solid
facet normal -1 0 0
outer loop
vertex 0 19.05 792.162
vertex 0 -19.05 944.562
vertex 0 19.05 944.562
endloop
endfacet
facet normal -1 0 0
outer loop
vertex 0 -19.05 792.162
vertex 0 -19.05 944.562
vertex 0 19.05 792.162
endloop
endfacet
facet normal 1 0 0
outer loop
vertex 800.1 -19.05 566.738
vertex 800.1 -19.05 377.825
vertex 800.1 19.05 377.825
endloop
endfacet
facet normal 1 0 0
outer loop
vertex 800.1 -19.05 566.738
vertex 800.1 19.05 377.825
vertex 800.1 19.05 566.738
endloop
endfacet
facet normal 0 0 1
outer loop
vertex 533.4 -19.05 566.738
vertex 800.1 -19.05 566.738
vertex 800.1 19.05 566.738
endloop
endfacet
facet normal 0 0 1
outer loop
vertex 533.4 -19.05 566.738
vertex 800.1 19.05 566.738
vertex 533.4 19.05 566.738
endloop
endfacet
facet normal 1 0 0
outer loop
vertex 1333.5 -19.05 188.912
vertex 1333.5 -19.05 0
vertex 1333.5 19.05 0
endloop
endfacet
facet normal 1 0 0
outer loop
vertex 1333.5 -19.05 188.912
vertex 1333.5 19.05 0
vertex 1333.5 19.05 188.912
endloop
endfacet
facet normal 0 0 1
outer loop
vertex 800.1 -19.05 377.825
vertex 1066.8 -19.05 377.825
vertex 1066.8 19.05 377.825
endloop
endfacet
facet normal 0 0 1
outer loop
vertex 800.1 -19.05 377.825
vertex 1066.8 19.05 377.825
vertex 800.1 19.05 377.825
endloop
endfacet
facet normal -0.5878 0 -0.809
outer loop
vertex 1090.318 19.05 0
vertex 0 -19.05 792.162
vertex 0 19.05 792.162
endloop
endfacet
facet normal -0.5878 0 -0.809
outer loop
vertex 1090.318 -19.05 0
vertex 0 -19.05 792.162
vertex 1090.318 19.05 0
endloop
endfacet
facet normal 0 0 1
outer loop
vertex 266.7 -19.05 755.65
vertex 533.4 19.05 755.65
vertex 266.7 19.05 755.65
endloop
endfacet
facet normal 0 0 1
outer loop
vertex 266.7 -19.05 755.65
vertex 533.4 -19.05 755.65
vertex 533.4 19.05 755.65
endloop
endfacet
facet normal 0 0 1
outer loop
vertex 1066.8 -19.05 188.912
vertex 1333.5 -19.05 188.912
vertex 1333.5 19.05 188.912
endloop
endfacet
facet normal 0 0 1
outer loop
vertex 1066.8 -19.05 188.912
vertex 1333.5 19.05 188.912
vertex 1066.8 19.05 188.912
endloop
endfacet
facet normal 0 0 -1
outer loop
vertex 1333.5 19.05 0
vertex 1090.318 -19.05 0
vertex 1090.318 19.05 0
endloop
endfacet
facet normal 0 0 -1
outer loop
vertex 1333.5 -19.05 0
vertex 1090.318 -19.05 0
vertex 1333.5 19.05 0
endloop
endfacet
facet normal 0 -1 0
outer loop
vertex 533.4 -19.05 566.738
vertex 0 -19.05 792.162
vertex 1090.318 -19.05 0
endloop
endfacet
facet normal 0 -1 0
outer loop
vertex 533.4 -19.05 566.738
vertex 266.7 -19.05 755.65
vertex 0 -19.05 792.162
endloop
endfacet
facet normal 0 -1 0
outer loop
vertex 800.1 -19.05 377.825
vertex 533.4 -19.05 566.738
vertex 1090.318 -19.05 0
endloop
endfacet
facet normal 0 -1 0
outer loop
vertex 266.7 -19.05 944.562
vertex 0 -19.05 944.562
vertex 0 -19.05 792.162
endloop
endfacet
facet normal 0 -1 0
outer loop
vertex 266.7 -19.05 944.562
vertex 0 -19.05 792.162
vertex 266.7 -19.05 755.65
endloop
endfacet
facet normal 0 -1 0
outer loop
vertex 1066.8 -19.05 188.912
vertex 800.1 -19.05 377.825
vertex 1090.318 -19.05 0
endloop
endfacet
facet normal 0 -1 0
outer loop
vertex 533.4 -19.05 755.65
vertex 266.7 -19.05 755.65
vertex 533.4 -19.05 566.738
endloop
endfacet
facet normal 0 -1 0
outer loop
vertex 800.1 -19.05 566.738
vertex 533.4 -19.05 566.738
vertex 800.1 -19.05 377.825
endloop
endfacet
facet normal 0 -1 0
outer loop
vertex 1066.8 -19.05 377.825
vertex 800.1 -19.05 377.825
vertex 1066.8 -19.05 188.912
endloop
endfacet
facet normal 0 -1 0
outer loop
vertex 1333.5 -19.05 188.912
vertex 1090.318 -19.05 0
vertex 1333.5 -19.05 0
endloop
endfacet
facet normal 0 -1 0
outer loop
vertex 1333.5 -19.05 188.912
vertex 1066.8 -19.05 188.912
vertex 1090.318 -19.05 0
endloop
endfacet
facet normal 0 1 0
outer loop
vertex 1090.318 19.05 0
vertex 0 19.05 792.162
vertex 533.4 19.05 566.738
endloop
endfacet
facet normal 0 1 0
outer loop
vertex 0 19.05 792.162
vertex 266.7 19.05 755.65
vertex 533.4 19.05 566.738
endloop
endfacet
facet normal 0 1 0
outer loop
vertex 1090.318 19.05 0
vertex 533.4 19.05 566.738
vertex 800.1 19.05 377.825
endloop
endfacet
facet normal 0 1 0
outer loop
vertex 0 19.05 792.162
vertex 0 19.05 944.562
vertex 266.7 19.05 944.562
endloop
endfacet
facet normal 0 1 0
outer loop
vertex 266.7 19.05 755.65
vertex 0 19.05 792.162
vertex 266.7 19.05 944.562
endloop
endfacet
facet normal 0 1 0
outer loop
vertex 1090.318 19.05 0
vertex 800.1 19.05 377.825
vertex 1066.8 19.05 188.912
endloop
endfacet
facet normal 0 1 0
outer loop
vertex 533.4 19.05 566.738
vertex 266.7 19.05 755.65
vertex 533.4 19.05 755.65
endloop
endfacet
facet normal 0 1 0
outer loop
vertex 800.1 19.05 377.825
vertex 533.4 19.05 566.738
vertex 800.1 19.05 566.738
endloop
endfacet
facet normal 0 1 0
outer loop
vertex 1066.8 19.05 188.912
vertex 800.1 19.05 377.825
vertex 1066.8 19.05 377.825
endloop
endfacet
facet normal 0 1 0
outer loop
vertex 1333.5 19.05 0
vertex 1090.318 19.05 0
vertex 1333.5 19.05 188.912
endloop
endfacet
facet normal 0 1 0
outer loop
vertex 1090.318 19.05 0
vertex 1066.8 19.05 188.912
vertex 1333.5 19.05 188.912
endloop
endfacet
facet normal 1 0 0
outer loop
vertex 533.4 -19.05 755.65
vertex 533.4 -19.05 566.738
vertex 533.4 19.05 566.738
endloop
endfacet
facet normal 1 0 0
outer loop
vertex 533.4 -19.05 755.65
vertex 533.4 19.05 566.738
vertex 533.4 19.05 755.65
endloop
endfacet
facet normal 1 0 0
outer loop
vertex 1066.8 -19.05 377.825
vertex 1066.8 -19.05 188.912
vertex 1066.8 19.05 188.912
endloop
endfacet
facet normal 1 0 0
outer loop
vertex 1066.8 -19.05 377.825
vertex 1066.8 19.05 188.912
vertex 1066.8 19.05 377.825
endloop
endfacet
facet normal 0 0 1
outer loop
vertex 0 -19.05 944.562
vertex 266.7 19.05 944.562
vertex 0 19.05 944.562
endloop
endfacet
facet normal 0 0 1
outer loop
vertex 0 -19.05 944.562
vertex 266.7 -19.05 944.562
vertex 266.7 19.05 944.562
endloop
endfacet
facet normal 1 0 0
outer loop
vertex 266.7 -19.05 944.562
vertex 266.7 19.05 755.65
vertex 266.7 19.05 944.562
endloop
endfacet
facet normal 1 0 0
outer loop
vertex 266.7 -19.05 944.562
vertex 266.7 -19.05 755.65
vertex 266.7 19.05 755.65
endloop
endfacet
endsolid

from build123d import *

# Parameters (mm, degrees)
F1_DEPTH = 19.05


with BuildPart() as f1:
    # F0 (on Front) → F1 (new body, symmetric)
    with BuildSketch(Plane.XZ):
        Polygon((266.7, 944.5625), (0, 944.5625), (0, 792.1625), (1090.318143, 0), (1333.5, 0), (1333.5, 188.9125), (1066.8, 188.9125), (1066.8, 377.825), (800.1, 377.825), (800.1, 566.7375), (533.4, 566.7375), (533.4, 755.65), (266.7, 755.65), align=None)
    extrude(amount=F1_DEPTH, both=True)


solid = f1.part
